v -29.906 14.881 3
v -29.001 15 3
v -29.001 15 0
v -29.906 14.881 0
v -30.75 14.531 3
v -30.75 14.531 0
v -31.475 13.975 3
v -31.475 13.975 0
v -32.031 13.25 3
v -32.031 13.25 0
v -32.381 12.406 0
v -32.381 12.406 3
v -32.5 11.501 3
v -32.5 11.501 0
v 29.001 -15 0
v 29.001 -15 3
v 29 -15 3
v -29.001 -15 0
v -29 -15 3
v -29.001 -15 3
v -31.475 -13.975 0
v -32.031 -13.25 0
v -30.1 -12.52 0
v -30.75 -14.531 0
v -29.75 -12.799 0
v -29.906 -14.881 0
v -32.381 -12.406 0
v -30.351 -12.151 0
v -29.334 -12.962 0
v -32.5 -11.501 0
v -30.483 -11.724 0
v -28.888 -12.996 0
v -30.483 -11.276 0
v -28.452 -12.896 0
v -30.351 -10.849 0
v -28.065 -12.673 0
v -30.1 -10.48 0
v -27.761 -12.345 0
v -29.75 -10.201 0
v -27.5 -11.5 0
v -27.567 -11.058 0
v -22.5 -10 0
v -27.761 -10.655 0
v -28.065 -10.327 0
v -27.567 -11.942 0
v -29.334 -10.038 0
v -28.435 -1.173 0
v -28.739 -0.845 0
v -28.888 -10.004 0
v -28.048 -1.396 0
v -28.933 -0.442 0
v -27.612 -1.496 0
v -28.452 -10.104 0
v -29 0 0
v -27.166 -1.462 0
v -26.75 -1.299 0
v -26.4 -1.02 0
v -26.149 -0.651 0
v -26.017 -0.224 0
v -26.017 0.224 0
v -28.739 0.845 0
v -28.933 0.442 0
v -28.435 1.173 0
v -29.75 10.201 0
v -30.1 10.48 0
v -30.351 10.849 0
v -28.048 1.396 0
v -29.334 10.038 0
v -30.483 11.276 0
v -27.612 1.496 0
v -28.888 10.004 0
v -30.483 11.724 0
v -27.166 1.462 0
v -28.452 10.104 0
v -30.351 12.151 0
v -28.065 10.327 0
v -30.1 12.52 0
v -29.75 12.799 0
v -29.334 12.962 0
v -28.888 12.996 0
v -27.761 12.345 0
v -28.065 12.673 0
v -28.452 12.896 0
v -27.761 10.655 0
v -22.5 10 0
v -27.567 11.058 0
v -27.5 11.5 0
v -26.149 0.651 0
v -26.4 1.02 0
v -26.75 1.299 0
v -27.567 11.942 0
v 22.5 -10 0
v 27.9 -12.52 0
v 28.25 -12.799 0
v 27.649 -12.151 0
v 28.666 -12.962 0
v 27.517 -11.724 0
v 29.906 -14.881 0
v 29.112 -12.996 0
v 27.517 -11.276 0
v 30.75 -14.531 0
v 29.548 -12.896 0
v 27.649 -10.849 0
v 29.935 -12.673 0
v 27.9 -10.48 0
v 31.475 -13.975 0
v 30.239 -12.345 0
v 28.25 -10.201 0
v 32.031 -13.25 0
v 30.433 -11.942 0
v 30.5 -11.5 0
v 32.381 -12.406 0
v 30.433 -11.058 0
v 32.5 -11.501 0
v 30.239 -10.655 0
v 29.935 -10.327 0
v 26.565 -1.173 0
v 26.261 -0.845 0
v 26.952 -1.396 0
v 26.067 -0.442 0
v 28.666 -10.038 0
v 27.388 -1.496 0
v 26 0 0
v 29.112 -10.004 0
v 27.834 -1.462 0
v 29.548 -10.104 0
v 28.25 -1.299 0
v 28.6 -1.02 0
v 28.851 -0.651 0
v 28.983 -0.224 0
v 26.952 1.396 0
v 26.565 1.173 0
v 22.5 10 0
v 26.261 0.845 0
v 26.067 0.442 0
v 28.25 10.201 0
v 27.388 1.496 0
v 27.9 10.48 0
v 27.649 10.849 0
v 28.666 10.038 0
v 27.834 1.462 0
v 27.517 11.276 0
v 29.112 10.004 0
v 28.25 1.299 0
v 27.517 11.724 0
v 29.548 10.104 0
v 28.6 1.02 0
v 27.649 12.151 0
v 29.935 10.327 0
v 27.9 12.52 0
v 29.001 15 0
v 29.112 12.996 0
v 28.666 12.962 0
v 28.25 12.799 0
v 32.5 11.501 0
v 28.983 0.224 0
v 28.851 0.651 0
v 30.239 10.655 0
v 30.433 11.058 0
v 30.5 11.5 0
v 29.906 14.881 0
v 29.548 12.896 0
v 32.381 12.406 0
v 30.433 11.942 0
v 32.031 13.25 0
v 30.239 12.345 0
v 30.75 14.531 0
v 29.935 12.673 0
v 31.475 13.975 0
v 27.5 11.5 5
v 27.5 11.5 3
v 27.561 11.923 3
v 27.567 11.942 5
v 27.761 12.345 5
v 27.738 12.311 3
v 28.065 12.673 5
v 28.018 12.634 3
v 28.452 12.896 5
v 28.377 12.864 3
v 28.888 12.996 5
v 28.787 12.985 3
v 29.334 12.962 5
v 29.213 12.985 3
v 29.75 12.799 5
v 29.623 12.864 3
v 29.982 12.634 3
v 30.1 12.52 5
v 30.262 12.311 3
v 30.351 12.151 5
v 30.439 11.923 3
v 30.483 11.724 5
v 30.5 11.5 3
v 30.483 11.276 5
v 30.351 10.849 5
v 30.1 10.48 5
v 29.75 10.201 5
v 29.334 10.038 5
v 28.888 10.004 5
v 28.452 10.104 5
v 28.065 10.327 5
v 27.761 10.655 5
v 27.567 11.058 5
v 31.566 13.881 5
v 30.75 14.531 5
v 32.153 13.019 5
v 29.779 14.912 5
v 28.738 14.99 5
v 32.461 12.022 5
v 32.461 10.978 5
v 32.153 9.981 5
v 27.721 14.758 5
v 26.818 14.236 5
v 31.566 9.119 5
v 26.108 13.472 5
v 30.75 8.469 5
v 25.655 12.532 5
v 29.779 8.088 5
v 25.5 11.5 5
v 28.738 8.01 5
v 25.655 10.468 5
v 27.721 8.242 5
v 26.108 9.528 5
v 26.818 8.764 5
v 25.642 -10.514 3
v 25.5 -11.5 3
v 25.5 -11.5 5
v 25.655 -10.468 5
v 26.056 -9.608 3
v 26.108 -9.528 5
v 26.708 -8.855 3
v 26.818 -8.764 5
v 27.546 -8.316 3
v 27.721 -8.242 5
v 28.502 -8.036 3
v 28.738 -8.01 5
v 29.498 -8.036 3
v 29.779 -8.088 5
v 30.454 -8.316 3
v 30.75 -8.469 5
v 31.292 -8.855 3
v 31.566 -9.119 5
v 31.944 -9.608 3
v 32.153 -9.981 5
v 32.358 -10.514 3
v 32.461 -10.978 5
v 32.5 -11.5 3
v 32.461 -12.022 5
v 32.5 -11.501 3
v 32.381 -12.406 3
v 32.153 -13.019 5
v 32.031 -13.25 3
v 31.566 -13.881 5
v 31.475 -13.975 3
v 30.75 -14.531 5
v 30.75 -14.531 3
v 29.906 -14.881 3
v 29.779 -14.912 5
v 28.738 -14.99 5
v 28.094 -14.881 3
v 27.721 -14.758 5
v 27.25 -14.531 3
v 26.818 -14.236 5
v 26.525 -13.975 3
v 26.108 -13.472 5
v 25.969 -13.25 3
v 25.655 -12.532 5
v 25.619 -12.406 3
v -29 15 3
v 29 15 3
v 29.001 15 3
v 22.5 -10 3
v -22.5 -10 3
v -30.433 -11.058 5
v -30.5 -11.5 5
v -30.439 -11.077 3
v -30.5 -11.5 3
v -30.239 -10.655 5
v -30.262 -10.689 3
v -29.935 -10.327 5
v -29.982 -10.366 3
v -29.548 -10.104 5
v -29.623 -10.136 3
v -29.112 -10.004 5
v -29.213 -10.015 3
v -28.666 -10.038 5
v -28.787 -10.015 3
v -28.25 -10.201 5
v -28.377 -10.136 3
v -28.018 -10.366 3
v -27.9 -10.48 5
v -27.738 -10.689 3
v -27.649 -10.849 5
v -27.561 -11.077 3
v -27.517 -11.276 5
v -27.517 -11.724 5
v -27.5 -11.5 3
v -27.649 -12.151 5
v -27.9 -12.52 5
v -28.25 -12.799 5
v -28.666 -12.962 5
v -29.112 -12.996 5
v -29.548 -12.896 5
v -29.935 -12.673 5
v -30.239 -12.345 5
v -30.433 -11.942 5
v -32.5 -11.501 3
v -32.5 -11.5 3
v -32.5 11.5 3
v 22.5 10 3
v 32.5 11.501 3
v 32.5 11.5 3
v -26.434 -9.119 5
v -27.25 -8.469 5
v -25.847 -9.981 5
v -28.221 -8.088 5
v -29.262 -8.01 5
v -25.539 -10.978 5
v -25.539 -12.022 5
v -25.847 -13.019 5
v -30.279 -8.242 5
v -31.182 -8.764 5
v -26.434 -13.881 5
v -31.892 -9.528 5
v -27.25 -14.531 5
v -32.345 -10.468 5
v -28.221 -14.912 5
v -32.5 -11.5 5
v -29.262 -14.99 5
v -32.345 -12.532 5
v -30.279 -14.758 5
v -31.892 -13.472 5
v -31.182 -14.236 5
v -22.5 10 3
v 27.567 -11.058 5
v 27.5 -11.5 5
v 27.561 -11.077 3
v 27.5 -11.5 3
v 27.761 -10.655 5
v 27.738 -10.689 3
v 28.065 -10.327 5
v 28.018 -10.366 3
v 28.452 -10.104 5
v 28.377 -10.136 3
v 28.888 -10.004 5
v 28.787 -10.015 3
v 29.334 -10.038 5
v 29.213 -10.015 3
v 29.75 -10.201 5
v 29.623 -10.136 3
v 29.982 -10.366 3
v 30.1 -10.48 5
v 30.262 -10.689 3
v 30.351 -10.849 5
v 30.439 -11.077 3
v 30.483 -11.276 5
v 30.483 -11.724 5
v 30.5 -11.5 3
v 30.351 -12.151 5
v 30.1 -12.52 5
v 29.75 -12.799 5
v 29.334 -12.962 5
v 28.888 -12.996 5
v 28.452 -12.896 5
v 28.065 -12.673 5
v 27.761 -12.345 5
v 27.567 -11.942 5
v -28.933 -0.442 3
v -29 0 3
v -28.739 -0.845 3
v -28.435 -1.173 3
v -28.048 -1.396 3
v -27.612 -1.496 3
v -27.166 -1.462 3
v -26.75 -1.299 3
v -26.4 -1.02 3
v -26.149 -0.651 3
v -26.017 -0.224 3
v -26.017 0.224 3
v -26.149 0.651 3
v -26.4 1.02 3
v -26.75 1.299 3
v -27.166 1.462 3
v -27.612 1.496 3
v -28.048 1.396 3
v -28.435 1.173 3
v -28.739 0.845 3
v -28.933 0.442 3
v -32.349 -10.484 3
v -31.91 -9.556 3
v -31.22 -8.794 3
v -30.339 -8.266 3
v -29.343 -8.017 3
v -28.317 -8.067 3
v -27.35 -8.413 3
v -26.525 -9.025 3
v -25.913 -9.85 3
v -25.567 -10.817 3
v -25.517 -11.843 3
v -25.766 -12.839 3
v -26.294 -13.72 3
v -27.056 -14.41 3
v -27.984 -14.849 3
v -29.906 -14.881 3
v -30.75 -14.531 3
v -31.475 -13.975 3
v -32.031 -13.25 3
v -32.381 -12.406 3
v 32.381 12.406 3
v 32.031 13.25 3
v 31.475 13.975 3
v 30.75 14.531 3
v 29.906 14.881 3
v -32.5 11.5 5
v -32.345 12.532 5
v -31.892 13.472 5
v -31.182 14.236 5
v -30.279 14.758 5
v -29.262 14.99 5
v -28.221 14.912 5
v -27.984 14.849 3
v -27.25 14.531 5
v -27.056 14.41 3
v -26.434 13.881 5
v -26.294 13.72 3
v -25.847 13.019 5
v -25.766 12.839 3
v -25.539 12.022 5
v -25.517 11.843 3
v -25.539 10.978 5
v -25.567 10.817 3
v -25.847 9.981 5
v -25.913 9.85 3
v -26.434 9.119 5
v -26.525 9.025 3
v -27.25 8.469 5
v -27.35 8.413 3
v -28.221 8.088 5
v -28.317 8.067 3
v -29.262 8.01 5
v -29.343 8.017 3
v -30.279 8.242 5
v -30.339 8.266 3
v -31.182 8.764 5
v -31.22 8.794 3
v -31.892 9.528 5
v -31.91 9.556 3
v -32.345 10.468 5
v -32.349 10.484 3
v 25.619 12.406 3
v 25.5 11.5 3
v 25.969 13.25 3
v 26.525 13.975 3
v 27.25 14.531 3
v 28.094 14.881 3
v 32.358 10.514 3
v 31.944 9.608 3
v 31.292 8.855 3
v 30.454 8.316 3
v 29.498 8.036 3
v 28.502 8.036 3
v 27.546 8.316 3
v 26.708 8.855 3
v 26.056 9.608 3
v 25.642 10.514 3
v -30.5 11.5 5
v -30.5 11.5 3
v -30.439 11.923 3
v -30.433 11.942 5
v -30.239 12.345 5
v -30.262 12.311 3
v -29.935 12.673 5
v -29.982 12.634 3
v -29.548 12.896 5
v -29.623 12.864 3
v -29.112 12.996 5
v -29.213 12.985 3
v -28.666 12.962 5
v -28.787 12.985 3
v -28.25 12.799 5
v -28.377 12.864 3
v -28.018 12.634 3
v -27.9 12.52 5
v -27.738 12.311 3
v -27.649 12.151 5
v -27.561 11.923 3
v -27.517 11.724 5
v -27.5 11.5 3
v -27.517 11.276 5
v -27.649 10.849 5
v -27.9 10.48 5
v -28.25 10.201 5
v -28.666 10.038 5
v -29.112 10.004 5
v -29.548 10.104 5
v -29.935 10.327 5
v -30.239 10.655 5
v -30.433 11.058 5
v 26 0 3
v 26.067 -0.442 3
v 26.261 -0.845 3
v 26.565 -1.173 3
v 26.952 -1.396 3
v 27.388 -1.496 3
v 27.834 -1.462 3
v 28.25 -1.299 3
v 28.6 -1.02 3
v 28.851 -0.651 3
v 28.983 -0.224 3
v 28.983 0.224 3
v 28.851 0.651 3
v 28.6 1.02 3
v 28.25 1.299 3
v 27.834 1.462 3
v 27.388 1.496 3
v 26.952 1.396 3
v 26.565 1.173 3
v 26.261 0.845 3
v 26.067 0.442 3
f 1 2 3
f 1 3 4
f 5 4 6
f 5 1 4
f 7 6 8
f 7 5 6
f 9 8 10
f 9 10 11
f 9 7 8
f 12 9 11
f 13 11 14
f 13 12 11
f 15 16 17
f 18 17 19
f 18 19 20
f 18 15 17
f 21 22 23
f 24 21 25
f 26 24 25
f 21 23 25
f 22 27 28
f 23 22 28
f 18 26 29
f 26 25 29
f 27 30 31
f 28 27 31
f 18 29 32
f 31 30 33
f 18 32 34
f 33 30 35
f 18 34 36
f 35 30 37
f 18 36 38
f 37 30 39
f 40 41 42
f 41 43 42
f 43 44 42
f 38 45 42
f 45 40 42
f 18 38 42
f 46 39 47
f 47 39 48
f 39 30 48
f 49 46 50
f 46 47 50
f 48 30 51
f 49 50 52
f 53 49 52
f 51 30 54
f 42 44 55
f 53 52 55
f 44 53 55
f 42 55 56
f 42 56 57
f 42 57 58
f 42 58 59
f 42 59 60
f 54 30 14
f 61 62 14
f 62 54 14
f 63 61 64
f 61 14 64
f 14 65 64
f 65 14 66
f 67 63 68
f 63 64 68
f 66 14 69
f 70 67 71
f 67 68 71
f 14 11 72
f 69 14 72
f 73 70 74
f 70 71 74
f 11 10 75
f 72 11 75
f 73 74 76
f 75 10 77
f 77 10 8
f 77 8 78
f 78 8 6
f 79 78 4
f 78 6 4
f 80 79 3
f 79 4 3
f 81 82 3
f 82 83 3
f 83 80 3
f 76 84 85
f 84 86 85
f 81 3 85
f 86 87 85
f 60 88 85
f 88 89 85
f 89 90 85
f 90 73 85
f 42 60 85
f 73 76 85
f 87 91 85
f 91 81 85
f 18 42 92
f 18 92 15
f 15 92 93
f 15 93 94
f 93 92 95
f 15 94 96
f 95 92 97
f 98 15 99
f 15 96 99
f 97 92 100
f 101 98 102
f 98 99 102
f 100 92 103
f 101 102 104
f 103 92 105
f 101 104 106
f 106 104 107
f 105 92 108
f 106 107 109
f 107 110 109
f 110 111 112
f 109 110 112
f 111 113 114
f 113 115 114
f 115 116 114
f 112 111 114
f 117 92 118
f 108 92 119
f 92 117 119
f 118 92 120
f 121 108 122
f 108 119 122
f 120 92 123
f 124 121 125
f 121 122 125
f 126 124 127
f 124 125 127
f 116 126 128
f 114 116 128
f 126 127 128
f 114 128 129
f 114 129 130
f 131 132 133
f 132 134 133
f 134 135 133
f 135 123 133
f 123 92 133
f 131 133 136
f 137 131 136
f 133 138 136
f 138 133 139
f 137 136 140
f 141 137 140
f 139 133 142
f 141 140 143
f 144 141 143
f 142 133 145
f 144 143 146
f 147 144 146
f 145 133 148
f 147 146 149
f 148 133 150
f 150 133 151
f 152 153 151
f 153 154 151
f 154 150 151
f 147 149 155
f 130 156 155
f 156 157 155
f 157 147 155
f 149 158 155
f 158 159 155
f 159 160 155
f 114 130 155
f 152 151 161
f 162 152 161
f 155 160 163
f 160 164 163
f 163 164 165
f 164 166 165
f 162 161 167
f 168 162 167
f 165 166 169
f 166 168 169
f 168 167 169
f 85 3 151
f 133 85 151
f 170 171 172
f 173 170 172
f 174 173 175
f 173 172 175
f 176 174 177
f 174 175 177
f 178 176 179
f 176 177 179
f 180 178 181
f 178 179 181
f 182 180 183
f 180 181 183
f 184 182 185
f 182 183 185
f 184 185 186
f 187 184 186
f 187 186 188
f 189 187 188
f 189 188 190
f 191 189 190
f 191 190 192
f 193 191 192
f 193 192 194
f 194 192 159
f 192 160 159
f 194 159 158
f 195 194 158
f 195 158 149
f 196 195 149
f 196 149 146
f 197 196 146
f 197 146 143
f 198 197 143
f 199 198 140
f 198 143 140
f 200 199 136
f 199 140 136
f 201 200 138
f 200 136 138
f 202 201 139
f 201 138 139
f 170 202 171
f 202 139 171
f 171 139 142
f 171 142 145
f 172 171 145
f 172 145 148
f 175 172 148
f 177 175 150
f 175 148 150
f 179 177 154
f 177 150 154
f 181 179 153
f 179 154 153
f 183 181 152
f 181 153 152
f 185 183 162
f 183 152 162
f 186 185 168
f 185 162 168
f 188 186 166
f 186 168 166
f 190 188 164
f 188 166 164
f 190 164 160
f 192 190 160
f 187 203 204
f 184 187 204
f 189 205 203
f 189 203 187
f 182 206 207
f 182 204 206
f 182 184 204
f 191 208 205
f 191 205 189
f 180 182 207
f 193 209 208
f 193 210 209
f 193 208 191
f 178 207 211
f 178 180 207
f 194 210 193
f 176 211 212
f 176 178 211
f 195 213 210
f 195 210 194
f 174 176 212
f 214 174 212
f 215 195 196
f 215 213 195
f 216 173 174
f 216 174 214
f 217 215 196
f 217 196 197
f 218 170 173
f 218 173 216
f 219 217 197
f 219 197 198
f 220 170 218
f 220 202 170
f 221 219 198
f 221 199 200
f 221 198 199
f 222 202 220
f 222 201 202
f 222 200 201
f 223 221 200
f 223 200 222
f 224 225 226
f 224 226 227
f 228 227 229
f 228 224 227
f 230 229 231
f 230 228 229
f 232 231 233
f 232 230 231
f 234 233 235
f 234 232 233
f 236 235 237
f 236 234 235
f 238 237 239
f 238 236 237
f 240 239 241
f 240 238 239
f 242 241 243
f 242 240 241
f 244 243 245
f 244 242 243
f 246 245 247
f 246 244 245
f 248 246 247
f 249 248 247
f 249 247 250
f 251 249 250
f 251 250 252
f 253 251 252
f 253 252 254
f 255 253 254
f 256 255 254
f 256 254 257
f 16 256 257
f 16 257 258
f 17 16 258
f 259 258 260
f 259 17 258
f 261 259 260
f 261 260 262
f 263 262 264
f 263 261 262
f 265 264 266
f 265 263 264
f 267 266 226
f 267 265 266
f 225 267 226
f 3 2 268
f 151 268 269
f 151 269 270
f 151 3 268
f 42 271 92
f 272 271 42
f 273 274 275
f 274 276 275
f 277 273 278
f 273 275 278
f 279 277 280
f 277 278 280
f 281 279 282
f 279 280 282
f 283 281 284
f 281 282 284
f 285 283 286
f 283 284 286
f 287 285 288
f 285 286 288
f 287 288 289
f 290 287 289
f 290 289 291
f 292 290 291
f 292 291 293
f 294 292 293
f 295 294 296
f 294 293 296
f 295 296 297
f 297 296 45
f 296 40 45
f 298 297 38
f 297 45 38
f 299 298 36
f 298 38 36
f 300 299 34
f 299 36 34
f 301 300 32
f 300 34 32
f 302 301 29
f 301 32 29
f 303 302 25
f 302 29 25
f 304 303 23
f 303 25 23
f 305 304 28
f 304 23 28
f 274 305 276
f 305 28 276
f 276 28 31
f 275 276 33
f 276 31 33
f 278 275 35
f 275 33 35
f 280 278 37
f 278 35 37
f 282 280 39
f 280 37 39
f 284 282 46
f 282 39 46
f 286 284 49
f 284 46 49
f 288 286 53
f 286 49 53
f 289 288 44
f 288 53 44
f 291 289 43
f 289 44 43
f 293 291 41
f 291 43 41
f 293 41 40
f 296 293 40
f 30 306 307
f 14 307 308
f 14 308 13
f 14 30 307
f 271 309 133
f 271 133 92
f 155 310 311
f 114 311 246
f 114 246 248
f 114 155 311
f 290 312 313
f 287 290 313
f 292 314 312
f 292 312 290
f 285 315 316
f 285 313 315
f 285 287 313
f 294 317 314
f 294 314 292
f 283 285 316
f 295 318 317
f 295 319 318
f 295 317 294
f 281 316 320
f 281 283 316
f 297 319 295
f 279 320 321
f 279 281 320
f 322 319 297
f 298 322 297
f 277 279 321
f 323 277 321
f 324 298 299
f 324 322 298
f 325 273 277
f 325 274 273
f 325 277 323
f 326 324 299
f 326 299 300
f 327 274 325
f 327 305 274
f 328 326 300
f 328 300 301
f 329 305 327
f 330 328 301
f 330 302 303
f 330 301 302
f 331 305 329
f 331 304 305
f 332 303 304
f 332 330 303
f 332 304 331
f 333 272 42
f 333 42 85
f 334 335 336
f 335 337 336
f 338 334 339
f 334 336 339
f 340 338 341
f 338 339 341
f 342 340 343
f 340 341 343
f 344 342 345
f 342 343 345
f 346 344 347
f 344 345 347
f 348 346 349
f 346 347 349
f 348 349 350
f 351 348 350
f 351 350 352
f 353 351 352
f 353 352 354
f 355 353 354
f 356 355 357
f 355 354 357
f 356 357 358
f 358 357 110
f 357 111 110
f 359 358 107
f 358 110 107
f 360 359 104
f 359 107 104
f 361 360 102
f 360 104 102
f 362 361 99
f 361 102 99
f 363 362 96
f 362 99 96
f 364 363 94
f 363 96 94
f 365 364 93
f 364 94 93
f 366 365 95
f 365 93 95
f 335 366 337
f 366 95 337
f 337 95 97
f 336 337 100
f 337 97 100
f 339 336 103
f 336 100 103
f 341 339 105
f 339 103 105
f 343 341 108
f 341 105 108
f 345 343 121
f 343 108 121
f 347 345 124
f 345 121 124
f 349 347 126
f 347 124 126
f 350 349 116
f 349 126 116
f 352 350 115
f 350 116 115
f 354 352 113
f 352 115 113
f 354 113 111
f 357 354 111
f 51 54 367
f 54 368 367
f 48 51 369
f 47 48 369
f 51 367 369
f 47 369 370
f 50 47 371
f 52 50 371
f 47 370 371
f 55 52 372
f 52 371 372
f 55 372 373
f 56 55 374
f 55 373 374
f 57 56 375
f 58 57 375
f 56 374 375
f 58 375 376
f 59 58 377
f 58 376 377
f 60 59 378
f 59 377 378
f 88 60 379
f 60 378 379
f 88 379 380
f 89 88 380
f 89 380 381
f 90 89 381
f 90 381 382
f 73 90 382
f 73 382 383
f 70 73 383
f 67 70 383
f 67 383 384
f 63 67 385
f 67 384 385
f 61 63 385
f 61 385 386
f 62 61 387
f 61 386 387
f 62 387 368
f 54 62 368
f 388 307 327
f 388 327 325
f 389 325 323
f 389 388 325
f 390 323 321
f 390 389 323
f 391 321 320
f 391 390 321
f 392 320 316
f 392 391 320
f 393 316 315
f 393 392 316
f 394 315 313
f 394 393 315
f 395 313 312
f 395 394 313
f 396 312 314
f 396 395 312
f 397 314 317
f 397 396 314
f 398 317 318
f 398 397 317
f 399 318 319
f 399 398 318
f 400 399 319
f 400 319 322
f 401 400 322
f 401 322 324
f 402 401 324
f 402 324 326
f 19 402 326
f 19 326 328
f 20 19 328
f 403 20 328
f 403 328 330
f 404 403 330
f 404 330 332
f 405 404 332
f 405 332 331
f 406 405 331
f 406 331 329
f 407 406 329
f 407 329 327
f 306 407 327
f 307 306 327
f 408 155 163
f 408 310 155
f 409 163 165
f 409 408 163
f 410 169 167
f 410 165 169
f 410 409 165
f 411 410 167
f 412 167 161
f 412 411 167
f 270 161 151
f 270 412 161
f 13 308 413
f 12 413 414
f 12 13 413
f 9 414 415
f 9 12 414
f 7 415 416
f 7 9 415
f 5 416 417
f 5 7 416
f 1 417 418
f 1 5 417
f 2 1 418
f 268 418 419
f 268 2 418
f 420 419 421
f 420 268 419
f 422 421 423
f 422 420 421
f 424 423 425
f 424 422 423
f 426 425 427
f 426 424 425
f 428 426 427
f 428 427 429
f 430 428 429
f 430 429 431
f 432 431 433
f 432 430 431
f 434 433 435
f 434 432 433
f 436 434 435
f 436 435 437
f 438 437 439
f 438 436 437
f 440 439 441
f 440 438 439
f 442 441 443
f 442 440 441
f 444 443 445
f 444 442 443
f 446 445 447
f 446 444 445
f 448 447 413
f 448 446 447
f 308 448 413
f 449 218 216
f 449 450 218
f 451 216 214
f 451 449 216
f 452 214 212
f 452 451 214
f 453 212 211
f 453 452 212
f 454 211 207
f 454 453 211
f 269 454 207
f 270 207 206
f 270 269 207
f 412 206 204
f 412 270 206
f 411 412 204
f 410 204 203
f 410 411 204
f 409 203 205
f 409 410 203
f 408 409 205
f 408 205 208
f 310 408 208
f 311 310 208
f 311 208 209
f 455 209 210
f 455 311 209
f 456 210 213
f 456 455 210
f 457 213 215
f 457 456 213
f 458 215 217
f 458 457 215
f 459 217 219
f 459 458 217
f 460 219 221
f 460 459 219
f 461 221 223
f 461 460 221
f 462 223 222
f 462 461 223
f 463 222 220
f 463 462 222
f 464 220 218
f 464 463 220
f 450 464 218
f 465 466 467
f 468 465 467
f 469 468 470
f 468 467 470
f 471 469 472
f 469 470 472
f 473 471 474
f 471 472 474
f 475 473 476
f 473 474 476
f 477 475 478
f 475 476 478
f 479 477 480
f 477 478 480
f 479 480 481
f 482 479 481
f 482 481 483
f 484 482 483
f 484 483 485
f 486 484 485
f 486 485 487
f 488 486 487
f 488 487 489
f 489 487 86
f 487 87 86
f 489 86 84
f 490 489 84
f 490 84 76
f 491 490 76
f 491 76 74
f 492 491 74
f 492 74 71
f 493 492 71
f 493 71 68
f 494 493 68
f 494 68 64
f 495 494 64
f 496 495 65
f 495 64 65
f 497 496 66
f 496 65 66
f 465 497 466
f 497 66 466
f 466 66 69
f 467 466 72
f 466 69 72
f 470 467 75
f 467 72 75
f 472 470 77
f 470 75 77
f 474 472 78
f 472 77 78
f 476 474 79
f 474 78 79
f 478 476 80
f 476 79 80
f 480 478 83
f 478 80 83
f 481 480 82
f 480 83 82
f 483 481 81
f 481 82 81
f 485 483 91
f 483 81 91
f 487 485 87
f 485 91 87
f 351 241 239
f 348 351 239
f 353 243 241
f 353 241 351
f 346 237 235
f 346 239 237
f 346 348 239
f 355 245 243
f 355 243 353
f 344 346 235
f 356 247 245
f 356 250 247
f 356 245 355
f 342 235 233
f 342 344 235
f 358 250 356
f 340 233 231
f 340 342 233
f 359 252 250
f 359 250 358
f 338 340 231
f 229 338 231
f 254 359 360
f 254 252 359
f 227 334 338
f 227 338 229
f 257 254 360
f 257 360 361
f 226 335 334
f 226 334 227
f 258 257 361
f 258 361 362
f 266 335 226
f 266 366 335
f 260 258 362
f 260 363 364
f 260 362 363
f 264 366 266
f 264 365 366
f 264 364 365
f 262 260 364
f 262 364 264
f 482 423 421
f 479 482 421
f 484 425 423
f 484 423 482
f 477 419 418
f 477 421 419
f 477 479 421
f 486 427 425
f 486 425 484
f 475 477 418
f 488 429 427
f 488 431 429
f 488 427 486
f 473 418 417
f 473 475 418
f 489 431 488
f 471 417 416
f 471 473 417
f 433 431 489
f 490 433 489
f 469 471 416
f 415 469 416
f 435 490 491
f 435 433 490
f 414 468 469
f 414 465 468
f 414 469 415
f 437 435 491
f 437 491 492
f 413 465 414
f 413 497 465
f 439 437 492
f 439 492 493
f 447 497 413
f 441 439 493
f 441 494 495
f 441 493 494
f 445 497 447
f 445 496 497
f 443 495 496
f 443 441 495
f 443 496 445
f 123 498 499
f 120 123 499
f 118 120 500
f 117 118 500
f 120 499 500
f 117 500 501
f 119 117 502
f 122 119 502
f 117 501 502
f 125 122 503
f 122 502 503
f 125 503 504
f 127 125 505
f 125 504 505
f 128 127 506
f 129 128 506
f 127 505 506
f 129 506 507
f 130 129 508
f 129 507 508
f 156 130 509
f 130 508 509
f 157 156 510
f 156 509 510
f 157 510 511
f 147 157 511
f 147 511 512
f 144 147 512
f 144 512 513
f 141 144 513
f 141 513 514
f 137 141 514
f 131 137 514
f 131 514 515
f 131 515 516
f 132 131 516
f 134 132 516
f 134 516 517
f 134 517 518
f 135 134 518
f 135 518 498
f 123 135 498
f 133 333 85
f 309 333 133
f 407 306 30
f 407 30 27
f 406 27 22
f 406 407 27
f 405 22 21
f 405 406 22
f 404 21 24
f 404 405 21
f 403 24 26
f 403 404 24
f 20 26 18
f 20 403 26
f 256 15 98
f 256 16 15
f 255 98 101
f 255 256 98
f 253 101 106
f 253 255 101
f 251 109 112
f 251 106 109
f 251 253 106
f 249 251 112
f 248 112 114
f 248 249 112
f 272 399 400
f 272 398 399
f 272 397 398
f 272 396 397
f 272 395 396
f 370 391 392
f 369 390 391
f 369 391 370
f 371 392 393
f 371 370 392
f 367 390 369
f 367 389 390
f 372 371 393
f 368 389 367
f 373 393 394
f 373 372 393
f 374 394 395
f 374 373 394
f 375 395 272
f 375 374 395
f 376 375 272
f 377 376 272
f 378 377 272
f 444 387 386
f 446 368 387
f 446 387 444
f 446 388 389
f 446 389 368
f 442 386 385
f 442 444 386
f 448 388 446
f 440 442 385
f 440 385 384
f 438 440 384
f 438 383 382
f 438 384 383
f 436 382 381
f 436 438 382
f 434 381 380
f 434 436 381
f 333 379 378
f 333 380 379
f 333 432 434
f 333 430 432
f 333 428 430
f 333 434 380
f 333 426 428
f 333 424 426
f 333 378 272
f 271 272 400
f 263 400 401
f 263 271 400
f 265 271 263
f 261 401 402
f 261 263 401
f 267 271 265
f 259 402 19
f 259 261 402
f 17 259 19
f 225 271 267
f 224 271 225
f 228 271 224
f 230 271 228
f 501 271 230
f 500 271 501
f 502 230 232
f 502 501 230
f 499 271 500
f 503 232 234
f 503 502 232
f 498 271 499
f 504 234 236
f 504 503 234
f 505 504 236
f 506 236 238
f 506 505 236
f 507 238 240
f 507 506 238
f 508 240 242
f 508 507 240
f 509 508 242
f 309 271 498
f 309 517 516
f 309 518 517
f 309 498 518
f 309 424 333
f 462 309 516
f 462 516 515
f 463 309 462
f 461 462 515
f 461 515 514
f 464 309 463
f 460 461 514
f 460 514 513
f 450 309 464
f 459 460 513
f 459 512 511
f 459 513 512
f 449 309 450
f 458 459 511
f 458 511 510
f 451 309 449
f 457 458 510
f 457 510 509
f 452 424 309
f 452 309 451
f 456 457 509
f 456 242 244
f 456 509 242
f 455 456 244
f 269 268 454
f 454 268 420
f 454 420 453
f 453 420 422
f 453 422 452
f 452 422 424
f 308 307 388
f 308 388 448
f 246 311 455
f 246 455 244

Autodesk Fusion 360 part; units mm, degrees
sketch "Sketch1" plane through (0, 0, 0) normal (0, 0, 1) x (1, 0, 0)
  line L0 (-32.5, 15) -> (32.5, 15)
  line L1 (32.5, 15) -> (32.5, -15)
  line L2 (32.5, -15) -> (-32.5, -15)
  line L3 (-32.5, -15) -> (-32.5, 15)
  line L4 (-32.5, 15) -> (32.5, -15) construction
  line L5 (32.5, 15) -> (-32.5, -15) construction
  circle A0 centre (-29, 11.5) radius 1.5
  circle A1 centre (29, 11.5) radius 1.5
  circle A2 centre (-29, -11.5) radius 1.5
  circle A3 centre (29, -11.5) radius 1.5
  dimension "d1" = 65
  dimension "d2" = 30
  dimension "d3" = 3
  dimension "d4" = 3.5
  dimension "d5" = 3.5
  dimension "d8" = 58
  dimension "d9" = -23
extrude "Extrude1" add sketch "Sketch1" along normal blind 3
sketch "Sketch2" plane through (0, 0, 3) normal (0, 0, 1) x (-1, 0, 0)
  circle A0 centre (-29, -11.5) radius 1.5
  circle A1 centre (29, 11.5) radius 1.5
  circle A2 centre (29, -11.5) radius 1.5
  circle A3 centre (-29, 11.5) radius 1.5
  line L0 (32.5, 15) -> (-32.5, 15)
  line L1 (-32.5, 15) -> (-32.5, -15)
  line L2 (-32.5, -15) -> (32.5, -15)
  line L3 (32.5, -15) -> (32.5, 15)
  circle A4 centre (29, -11.5) radius 3.5
  circle A5 centre (-29, -11.5) radius 3.5
  circle A6 centre (29, 11.5) radius 3.5
  circle A7 centre (-29, 11.5) radius 3.5
  dimension "d14" = -58
  dimension "d15" = 23
extrude "Extrude2" add sketch "Sketch2" along normal blind 2 contours A6 | A7 | A4 | A5
fillet "Fillet1" radius 3.5 4 edges at (-32.5, -15, 1.5) (-32.5, 15, 1.5) (32.5, -15, 1.5) (32.5, 15, 1.5)
sketch "Sketch3" plane through (0, 0, 3) normal (0, 0, 1) x (-1, 0, 0)
  arc A0 (-29, -15) -> (-32.5, -11.5) centre (-29, -11.5) ccw
  line L0 (-29, -15) -> (29, -15)
  arc A1 (32.5, -11.5) -> (29, -15) centre (29, -11.5) ccw
  line L1 (32.5, -11.5) -> (32.5, 11.5)
  arc A2 (29, 15) -> (32.5, 11.5) centre (29, 11.5) ccw
  line L2 (29, 15) -> (-29, 15)
  arc A3 (-32.5, 11.5) -> (-29, 15) centre (-29, 11.5) ccw
  line L3 (-32.5, 11.5) -> (-32.5, -11.5)
  line L4 (25.5013, -11.5936) -> (-25.5013, 11.5936) construction
  line L5 (-25.5013, -11.5936) -> (25.5013, 11.5936) construction
  circle A4 centre (27.5, 0) radius 1.5
  circle A5 centre (-27.5, 0) radius 1.5
  line L6 (22.5, -10) -> (-22.5, -10)
  line L7 (-22.5, -10) -> (-22.5, 10)
  line L8 (-22.5, 10) -> (22.5, 10)
  line L9 (22.5, 10) -> (22.5, -10)
  line L10 (22.5, -10) -> (-22.5, 10) construction
  line L11 (-22.5, -10) -> (22.5, 10) construction
  dimension "d20" = 3
  dimension "d21" = 3
  dimension "d22" = 27.5
  dimension "d23" = 27.5
  dimension "d24" = 5
  dimension "d25" = 5
  dimension "d26" = 5
extrude "Extrude3" cut sketch "Sketch3" against normal up to surface (3 mm away) contours A4 | A5 | L6 L7 L8 L9
equation "d24 = d25"
equation "d26 = d25"
